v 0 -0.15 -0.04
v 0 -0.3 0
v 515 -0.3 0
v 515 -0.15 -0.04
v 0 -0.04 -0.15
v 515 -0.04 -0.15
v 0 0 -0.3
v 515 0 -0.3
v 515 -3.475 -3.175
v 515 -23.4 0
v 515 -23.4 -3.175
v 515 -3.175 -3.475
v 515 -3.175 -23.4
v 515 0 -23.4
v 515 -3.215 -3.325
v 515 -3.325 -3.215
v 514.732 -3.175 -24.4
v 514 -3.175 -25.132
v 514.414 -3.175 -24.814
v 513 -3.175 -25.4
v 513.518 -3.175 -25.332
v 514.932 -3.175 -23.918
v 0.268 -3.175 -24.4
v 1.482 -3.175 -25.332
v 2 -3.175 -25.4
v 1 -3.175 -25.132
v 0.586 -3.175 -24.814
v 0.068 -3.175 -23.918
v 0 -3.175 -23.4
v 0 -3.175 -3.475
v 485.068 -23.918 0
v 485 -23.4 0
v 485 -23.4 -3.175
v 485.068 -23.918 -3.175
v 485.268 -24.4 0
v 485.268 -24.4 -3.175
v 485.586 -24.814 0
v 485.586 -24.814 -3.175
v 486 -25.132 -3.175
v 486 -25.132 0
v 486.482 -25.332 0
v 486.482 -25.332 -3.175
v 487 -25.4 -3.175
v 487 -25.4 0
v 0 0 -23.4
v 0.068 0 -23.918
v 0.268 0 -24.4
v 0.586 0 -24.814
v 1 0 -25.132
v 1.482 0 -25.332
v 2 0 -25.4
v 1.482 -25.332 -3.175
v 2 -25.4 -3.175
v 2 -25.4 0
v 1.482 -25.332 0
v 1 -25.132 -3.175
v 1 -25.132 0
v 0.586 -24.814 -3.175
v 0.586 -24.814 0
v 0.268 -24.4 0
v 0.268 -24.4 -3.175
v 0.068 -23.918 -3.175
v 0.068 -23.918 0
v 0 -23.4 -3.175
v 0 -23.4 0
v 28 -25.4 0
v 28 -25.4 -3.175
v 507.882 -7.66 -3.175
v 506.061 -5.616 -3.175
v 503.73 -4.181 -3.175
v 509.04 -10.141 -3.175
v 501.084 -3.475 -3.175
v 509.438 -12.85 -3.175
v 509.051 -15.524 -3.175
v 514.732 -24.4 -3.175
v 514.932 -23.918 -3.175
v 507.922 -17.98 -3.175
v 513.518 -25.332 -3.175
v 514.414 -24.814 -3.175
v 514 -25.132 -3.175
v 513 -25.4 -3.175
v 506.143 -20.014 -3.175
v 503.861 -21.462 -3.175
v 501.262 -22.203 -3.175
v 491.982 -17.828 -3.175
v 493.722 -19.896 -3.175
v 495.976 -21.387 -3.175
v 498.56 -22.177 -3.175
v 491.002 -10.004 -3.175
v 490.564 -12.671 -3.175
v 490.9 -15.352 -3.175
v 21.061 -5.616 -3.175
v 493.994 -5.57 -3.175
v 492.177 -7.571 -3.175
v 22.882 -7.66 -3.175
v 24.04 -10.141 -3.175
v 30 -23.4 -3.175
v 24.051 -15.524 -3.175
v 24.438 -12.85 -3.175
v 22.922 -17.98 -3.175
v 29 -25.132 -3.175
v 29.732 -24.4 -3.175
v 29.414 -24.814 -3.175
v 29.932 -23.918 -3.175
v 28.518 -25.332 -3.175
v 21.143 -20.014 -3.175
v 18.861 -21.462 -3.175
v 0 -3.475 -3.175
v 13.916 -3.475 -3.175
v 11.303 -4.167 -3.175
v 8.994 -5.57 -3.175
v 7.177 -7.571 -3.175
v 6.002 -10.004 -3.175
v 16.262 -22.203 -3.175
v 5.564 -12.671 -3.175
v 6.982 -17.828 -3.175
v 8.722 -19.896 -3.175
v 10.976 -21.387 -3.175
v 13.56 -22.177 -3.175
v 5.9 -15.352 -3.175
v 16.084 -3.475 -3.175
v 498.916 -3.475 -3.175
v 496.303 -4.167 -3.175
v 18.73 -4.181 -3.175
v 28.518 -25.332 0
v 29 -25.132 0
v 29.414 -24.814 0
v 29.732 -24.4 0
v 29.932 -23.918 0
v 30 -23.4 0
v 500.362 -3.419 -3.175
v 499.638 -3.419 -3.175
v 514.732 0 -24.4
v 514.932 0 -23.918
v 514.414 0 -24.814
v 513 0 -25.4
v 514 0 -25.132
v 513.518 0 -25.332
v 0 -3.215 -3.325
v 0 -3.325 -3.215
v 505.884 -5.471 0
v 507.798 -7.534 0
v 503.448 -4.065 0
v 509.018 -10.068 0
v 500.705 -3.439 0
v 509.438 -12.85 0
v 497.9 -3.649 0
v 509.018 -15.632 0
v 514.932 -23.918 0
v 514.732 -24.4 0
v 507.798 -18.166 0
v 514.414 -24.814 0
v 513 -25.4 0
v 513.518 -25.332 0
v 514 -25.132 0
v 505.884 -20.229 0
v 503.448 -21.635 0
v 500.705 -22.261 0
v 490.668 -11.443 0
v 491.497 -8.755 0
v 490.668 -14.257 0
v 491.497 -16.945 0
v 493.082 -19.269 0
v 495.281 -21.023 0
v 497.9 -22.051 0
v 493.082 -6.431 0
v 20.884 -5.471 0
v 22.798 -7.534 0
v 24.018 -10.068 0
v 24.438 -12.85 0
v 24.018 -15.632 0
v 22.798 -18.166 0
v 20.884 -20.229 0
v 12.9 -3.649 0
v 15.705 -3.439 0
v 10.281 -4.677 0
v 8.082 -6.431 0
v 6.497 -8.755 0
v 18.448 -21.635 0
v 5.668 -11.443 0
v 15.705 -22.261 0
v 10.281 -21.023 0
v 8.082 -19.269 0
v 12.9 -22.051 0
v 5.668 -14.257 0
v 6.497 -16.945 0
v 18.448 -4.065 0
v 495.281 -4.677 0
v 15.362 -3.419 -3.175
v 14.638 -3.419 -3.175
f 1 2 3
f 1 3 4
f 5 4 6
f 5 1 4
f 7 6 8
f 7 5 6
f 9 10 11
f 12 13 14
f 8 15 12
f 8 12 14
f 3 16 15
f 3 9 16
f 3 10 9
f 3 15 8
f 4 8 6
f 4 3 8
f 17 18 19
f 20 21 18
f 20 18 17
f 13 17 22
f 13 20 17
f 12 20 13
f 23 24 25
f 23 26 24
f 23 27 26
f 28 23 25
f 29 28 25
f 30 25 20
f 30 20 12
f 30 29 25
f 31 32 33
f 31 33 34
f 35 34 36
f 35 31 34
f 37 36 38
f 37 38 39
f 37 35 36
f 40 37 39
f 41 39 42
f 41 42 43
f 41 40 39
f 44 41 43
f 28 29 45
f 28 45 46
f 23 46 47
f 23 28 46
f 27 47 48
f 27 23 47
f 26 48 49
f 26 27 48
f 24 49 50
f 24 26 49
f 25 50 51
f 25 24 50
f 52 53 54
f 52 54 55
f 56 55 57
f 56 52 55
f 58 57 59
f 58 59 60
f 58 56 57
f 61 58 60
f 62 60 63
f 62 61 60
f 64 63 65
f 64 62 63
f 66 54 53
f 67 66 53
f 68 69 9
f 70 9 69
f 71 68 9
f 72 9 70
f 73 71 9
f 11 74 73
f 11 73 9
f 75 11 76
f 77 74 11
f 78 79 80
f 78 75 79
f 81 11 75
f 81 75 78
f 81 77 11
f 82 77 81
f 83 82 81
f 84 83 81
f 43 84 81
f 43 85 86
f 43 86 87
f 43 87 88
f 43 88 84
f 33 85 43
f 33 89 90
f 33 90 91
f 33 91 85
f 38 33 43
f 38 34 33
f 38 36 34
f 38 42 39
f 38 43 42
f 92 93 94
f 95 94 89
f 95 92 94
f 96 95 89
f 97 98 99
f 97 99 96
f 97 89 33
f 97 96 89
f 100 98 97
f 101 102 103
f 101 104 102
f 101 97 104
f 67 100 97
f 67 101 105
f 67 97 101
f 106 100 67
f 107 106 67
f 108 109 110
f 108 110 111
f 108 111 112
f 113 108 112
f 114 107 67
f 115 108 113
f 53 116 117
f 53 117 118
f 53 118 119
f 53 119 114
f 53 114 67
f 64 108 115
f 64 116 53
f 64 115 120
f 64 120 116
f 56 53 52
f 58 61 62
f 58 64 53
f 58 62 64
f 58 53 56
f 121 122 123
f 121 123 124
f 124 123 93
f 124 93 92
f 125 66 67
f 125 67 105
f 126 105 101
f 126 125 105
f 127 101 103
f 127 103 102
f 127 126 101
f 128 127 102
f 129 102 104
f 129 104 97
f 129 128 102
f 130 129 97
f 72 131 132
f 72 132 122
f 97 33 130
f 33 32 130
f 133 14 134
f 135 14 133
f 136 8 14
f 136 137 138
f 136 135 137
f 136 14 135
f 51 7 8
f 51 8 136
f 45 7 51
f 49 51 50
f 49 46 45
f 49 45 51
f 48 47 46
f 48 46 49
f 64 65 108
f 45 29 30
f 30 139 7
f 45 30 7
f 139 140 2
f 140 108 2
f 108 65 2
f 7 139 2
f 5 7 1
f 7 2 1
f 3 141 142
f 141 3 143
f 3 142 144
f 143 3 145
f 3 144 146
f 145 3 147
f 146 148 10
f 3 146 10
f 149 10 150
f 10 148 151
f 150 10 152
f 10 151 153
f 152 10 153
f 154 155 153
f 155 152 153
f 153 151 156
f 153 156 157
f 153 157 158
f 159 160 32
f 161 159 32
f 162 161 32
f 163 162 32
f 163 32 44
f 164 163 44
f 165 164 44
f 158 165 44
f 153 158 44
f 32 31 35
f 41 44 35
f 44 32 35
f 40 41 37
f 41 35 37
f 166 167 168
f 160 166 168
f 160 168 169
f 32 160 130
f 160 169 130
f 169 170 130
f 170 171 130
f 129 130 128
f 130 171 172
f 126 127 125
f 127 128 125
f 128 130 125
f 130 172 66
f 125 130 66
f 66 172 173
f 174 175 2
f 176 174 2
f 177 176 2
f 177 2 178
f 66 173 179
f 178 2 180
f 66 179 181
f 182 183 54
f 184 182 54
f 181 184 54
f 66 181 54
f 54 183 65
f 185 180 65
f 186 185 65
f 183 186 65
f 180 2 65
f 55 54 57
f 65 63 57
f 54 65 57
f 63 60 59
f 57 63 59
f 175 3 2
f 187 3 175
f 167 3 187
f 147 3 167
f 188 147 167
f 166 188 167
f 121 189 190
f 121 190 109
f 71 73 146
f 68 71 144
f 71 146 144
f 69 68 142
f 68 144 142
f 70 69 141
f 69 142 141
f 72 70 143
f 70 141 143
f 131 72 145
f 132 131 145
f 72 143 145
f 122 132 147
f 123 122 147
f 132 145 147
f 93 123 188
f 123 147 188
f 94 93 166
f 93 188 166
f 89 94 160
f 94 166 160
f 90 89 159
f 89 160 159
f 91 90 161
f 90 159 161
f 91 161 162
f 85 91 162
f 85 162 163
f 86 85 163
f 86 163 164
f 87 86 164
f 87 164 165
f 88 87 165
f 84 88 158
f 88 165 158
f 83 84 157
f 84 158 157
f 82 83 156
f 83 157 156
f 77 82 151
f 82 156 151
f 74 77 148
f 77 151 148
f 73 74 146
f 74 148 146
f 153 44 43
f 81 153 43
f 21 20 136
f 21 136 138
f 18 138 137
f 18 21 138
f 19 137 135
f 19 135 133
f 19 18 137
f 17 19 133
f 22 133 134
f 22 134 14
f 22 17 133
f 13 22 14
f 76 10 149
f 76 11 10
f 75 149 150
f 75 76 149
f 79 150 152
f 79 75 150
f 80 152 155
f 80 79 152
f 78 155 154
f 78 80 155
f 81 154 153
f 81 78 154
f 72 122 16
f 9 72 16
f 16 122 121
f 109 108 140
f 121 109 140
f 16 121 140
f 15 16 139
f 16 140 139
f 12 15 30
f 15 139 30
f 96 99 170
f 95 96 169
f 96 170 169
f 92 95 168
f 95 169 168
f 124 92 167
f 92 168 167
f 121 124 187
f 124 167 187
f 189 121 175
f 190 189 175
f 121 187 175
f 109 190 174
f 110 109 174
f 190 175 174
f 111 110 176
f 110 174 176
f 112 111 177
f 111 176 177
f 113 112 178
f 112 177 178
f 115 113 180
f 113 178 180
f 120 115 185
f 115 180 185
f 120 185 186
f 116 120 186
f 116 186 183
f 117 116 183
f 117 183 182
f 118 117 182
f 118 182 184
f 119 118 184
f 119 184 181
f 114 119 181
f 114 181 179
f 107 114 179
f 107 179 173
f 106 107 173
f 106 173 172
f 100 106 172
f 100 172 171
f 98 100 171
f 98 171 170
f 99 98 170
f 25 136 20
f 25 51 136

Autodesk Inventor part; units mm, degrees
ref_plane "YZ Plane" through (0, 0, 0) normal (1, 0, 0) x (0, 1, 0)
ref_plane "XZ Plane" through (0, 0, 0) normal (0, 1, 0) x (-1, 0, 0)
ref_plane "XY Plane" through (0, 0, 0) normal (0, 0, 1) x (1, 0, 0)
sketch "Boceto1" plane through (0, 0, 0) normal (1, 0, 0) x (0, 1, 0)
  line L0 (0, -0.3) -> (0, -25.4)
  line L1 (-0.3, 0) -> (-25.4, 0)
  arc A0 (0, -0.3) -> (-0.3, 0) centre (-0.3, -0.3) ccw
  line L2 (-25.4, 0) -> (-25.4, -3.175)
  line L3 (0, -25.4) -> (-3.175, -25.4)
  line L4 (-3.175, -25.4) -> (-3.175, -3.475)
  line L5 (-3.475, -3.175) -> (-25.4, -3.175)
  arc A1 (-3.175, -3.475) -> (-3.475, -3.175) centre (-3.475, -3.475) ccw
  point P0 (0, 0)
  dimension "d0" = 25.4
  dimension "d1" = 25.4
  dimension "d2" = 0.3
  dimension "d3" = 3.175
  dimension "d4" = 3.175
  dimension "d5" = 0.3
extrude "Extrusión1" add sketch "Boceto1" along normal blind 515
fillet "Empalme1" radius 2 4 edges at (515, -25.4, -1.5875) (515, -1.5875, -25.4) (0, -25.4, -1.5875) (0, -1.5875, -25.4)
sketch "Boceto3" plane through (0, -0.3, 0) normal (0, 0, 1) x (1, 0, 0)
  line L0 (0, 0) -> (515, 0) construction
  line L1 (257.5, 0) -> (257.5, -25.1) construction
  line L2 (2, -25.1) -> (513, -25.1) construction
  line L3 (257.5, -12.55) -> (500, -12.55) construction
  line L4 (257.5, -12.55) -> (15, -12.55) construction
  circle A0 centre (15, -12.55) radius 9.4375
  circle A1 centre (500, -12.55) radius 9.4375
  dimension "d11" = 242.5
  dimension "d12" = 242.5
  dimension "d13" = 18.875
  dimension "d16" = 18.875
extrude "Extrusión2" cut sketch "Boceto3" against normal up to surface (3.175 mm away)
sketch "Boceto4" plane through (0, -0.3, 0) normal (0, 0, 1) x (1, 0, 0)
  arc A0 (13.9157, -3.175) -> (16.0843, -3.175) centre (15, -12.55) ccw projected
  line L0 (2, -25.1) -> (513, -25.1) construction
  line L1 (30, -23.1) -> (30, 0) construction
  line L2 (0, 0) -> (515, 0) construction
  line L3 (28, -25.1) -> (2, -25.1) construction
  arc A1 (28, -25.1) -> (30, -23.1) centre (28, -23.1) ccw
  circle A2 centre (500, -12.55) radius 9.4375 construction
  line L4 (515, -23.1) -> (515, -3.175) construction
  line L5 (485, -23.1) -> (485, 0) construction
  line L6 (487, -25.1) -> (513, -25.1) construction
  arc A3 (485, -23.1) -> (487, -25.1) centre (487, -23.1) ccw
  line L7 (485, -23.1) -> (30, -23.1)
  line L8 (28, -25.1) -> (487, -25.1)
  point P0 (0, 0.3)
  point P1 (30, -25.1)
  point P2 (485, -25.1)
  dimension "d20" = 2
  dimension "d23" = 2
extrude "Extrusión3" cut sketch "Boceto4" against normal up to surface (3.175 mm away)
properties part number "angulo_caja_calor" material "Acero inoxidable AISI 304"
